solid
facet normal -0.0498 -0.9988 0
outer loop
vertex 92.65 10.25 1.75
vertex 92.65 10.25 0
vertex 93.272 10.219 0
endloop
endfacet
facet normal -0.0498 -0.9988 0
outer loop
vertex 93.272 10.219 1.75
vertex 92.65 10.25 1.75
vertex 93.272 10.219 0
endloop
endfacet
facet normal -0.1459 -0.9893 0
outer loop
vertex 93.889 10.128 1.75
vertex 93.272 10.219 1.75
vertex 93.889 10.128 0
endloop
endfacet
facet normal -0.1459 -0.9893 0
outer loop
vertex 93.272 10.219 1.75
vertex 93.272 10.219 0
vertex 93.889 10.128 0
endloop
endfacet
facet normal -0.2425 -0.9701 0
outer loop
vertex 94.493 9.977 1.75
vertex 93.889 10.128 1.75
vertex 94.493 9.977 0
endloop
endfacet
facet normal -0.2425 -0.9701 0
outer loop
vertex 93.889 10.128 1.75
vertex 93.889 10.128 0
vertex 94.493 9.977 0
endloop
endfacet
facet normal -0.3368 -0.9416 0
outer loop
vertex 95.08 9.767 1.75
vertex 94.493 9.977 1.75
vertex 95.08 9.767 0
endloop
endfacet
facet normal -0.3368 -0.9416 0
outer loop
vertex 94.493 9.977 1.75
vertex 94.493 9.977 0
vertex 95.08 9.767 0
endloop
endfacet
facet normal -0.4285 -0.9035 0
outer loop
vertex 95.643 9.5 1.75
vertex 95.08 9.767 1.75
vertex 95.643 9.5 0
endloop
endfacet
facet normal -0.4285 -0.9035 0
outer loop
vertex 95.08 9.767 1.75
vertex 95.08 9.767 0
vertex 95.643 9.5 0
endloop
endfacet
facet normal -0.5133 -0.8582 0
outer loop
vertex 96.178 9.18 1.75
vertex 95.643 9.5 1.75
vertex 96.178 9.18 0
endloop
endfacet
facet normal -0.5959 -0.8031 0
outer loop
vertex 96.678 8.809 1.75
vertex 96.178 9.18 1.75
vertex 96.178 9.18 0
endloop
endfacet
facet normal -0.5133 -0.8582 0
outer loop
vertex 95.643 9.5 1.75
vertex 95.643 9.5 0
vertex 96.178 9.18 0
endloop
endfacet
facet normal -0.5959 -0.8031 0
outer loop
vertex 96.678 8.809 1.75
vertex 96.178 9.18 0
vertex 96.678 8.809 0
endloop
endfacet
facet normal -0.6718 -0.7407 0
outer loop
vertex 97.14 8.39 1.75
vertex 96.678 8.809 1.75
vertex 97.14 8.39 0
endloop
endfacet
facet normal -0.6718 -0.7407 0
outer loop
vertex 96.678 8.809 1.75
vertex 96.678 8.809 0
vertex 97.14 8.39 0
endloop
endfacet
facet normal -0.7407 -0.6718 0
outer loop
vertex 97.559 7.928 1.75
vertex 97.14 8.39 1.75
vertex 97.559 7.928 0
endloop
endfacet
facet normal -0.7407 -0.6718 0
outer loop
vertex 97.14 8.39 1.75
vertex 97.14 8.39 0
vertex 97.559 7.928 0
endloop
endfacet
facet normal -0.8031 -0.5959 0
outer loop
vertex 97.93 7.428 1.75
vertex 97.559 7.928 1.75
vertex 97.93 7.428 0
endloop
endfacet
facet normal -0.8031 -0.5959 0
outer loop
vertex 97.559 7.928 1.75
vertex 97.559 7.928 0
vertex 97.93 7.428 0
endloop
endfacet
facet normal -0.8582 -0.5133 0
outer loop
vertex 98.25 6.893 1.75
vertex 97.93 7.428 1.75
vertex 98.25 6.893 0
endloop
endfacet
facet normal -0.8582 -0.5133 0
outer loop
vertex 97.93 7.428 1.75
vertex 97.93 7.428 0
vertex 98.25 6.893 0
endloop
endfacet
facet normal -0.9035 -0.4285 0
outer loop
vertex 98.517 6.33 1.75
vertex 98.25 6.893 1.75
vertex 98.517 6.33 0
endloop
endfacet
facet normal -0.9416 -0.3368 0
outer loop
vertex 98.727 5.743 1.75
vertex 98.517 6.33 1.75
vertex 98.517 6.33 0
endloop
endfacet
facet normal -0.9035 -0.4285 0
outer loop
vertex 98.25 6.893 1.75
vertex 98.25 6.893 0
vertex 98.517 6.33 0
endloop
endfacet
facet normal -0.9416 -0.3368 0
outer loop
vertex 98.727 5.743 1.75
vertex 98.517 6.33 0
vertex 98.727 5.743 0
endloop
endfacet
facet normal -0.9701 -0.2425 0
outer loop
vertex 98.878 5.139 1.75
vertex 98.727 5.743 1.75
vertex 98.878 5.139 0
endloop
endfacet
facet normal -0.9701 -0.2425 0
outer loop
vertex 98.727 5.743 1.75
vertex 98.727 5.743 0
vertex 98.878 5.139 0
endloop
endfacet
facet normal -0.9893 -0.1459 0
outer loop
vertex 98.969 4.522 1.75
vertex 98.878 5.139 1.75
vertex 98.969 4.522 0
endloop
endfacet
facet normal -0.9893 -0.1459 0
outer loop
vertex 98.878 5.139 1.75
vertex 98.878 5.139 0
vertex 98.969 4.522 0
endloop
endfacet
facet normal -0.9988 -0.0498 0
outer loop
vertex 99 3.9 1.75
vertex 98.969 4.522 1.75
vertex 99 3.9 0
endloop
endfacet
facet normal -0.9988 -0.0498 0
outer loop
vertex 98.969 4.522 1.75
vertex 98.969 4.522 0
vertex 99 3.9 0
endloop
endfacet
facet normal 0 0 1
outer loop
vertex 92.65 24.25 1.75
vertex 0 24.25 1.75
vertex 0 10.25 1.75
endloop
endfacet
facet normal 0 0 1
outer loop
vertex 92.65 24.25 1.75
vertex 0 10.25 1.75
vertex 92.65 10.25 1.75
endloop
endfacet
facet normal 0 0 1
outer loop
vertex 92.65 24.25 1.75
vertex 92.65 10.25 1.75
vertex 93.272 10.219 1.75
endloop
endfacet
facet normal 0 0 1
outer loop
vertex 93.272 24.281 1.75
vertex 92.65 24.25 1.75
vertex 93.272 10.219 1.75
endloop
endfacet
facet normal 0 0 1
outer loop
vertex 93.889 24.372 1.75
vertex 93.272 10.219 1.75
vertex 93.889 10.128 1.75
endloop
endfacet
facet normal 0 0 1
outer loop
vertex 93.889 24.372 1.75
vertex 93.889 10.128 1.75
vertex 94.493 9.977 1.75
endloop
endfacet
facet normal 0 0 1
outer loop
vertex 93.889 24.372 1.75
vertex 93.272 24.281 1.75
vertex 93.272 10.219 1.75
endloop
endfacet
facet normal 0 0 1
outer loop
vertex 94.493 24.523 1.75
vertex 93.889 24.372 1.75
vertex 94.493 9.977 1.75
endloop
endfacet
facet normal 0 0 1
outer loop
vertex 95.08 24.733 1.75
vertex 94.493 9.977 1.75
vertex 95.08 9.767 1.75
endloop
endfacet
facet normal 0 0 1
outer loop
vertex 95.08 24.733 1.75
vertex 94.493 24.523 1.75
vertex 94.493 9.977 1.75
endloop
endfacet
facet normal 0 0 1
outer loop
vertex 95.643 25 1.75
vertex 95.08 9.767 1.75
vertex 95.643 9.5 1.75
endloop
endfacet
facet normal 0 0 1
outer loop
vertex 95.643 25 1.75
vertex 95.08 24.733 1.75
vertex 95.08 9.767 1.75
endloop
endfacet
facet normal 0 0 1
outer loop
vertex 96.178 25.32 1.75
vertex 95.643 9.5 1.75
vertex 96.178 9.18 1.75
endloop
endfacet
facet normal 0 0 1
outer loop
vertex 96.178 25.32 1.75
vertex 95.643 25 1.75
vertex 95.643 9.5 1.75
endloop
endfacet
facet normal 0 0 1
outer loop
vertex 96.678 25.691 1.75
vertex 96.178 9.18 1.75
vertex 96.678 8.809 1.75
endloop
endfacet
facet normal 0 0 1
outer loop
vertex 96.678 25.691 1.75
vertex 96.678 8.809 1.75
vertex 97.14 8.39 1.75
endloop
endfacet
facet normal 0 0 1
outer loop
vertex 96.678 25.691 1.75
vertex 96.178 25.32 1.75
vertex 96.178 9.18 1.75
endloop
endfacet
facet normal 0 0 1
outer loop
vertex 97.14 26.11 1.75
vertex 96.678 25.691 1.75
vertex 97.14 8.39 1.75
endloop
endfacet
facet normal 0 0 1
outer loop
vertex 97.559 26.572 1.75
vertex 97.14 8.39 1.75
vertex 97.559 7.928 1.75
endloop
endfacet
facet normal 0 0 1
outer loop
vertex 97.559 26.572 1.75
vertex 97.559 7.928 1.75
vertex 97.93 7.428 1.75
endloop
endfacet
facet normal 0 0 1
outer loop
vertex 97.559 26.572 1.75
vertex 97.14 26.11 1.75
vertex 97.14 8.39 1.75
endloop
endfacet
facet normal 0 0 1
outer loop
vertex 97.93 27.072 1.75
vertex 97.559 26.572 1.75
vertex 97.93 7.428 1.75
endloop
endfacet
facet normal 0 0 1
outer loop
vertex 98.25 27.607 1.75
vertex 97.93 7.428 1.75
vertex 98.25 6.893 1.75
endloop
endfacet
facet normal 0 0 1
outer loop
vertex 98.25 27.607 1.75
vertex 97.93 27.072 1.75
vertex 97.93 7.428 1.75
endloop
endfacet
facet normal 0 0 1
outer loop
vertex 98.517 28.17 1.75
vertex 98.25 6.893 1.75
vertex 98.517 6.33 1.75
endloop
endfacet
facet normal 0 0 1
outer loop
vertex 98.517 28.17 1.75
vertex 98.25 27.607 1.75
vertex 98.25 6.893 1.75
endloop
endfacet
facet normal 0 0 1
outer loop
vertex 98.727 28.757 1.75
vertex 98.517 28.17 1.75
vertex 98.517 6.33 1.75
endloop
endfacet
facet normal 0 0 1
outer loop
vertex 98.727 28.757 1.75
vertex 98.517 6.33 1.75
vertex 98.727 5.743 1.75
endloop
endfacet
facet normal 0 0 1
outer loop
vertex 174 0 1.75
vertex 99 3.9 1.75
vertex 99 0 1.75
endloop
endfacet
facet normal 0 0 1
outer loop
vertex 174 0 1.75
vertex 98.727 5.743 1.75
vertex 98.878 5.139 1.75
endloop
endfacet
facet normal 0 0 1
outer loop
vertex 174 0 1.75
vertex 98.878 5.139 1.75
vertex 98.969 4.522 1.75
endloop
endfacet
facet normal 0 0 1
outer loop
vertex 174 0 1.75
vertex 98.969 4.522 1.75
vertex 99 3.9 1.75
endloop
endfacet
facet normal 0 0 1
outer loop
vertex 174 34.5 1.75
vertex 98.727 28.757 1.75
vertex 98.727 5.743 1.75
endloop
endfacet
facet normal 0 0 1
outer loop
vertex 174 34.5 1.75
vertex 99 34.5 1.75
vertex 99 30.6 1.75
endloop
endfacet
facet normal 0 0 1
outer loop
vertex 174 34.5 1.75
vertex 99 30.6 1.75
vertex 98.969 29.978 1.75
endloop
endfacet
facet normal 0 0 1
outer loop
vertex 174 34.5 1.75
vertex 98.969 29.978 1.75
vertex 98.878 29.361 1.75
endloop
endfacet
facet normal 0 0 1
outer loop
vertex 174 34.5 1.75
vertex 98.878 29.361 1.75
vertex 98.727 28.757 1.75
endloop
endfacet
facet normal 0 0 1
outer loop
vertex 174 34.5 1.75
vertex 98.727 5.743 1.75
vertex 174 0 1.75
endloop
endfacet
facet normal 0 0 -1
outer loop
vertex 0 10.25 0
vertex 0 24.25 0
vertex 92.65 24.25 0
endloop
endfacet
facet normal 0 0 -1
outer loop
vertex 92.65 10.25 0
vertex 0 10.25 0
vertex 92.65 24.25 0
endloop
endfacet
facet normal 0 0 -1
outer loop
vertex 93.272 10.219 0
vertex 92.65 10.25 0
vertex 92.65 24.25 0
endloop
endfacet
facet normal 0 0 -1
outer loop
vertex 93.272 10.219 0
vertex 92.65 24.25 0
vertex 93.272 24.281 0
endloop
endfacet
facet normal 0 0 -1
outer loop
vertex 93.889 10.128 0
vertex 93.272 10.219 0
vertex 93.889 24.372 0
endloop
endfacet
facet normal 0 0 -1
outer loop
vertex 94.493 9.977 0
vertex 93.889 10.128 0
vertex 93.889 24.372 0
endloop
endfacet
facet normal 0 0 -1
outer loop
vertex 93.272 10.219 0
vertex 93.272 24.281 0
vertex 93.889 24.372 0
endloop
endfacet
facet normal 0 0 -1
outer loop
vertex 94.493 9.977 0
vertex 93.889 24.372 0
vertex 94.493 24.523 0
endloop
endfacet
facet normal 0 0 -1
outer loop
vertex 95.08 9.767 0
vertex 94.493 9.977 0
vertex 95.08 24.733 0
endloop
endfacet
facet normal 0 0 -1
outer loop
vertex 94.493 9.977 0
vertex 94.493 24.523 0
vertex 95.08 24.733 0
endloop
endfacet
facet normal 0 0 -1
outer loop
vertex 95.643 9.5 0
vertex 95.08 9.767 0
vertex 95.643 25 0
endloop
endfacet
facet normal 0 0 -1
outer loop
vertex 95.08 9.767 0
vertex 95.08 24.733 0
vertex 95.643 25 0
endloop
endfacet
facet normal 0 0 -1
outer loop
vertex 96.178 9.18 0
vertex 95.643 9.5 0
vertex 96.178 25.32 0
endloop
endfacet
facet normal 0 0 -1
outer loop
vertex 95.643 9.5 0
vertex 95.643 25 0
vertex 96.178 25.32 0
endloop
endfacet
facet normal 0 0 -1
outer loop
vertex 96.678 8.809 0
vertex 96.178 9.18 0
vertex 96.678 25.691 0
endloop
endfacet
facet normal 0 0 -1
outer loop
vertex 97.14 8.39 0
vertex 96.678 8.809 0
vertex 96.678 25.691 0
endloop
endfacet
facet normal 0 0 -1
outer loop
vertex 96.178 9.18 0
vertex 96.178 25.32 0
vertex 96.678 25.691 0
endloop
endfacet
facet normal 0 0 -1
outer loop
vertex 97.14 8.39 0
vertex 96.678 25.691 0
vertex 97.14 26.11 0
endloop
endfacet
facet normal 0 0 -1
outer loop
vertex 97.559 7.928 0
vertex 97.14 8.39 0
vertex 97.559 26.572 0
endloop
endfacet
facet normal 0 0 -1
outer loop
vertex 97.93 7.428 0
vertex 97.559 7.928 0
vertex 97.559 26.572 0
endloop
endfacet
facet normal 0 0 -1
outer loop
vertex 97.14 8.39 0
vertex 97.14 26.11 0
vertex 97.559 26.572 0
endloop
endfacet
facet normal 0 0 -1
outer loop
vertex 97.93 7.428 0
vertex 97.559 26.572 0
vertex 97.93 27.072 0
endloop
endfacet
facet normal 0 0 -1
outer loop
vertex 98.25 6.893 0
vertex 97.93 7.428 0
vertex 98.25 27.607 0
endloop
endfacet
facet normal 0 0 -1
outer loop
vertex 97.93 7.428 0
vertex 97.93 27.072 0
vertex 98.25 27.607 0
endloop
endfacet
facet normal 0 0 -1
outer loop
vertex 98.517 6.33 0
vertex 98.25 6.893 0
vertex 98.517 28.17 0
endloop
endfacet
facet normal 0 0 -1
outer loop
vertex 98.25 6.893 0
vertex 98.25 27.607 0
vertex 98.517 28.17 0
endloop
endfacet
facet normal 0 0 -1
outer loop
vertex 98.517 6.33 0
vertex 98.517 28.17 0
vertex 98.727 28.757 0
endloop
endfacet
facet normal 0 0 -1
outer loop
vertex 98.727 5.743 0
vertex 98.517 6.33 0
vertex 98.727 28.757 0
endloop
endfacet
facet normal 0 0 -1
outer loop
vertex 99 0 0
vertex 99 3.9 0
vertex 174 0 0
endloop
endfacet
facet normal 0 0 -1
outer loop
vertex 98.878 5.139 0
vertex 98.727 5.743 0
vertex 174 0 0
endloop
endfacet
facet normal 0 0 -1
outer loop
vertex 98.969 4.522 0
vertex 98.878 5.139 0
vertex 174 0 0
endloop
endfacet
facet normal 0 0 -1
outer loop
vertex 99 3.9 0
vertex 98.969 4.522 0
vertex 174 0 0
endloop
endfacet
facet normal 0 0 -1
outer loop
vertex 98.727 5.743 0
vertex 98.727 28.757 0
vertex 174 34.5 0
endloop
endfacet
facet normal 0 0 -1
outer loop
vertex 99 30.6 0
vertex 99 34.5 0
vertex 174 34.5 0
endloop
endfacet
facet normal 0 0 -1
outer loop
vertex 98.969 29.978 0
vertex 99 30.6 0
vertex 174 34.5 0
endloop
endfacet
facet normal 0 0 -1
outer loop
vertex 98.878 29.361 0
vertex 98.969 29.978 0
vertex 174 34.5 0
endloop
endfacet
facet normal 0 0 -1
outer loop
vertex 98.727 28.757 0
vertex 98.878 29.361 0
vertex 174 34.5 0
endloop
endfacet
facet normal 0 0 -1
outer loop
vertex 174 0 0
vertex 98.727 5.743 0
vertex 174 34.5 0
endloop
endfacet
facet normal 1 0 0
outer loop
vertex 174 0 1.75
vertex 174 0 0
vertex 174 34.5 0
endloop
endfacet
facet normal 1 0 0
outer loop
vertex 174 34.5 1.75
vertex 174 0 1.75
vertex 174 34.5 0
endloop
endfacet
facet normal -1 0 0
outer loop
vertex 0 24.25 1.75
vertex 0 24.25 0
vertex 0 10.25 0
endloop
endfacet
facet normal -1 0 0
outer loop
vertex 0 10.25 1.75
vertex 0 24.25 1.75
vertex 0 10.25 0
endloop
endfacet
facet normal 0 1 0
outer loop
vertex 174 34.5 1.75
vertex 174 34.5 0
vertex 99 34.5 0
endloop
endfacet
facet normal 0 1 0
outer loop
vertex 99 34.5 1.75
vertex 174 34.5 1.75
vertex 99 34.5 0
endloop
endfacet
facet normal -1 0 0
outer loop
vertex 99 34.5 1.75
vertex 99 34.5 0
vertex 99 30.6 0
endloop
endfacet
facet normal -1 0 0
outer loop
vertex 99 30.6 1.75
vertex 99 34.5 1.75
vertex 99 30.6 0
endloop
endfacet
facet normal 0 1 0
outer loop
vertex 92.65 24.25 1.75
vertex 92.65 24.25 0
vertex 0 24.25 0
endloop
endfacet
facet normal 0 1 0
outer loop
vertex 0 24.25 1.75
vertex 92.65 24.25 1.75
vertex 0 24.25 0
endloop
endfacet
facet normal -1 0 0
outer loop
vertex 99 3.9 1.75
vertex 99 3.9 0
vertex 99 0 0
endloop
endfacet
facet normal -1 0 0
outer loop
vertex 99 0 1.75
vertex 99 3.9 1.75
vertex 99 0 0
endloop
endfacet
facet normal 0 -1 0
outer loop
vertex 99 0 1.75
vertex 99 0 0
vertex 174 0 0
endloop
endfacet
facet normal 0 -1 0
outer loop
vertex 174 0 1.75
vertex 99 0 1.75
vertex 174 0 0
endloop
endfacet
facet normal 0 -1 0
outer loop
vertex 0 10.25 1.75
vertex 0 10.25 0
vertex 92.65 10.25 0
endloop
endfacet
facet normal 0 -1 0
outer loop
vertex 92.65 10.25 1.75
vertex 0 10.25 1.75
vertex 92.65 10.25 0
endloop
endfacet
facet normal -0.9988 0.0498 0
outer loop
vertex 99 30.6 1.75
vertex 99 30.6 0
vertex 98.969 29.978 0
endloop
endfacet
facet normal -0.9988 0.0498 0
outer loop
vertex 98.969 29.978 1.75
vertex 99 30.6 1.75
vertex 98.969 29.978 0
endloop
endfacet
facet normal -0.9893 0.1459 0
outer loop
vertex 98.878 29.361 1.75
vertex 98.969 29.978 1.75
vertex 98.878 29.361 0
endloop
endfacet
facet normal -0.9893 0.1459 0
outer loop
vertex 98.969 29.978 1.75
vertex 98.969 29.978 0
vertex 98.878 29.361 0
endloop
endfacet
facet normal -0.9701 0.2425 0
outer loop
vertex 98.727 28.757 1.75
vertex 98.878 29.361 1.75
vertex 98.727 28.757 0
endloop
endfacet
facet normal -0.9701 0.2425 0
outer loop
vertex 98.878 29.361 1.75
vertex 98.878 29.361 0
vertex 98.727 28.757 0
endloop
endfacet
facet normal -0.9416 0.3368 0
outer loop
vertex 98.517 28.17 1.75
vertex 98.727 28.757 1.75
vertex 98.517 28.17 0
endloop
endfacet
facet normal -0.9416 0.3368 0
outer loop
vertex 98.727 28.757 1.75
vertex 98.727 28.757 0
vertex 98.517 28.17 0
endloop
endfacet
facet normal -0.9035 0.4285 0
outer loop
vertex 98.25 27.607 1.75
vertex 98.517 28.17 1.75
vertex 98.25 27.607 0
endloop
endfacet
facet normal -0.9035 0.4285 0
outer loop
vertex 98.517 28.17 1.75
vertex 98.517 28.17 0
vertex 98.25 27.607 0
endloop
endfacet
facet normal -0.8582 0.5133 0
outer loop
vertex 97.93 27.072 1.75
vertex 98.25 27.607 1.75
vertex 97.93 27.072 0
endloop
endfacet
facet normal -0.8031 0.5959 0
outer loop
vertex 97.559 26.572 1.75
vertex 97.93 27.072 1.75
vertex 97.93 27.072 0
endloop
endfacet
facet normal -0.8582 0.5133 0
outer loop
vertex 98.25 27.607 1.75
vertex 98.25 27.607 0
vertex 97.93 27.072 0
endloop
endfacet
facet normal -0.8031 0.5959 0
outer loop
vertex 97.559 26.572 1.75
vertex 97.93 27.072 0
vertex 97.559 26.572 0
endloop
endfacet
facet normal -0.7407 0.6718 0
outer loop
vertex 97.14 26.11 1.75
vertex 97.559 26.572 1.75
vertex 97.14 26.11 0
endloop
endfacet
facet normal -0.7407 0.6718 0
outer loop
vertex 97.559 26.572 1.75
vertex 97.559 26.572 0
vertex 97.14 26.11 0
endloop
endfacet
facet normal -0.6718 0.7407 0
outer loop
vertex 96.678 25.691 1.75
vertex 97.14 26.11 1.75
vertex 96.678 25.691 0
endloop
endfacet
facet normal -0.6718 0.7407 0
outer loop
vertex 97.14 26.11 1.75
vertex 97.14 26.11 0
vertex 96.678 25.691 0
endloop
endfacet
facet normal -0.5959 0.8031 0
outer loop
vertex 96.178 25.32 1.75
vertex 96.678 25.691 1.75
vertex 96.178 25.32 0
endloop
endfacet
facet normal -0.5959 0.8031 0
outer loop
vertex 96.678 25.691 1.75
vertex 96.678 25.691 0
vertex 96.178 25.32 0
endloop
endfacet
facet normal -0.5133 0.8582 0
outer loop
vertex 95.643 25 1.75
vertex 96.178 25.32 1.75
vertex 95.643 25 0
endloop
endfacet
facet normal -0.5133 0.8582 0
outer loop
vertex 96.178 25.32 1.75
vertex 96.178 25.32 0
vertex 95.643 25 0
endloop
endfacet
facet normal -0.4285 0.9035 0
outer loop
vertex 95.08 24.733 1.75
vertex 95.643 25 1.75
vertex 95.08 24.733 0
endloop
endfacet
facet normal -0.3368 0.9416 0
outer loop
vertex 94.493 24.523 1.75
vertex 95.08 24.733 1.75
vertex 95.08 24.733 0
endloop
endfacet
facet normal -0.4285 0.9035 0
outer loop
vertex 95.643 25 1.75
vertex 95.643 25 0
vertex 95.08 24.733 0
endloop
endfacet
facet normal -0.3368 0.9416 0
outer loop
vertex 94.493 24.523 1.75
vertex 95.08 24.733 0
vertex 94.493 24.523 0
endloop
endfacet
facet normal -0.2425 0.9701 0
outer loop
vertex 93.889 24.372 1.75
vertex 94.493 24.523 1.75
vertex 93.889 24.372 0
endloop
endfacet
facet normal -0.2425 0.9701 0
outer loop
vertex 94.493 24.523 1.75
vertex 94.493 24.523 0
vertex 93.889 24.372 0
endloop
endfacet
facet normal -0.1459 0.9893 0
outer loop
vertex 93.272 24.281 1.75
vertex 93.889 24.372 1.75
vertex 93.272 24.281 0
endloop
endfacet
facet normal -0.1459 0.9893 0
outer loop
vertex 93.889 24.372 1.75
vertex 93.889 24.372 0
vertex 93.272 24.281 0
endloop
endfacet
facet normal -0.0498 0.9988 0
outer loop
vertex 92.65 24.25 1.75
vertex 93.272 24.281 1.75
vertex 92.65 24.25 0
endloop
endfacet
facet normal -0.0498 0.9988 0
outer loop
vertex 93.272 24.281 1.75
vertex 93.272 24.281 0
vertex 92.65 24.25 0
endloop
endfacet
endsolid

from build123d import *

# Parameters (mm, degrees)
F1_DEPTH = 1.75


with BuildPart() as f1:
    # F0 (on Top) → F1 (new body)
    with BuildSketch(Plane.XY):
        with BuildLine():
            Line((99, 3.9), (99, 0))
            Line((99, 0), (174, 0))
            Line((174, 0), (174, 34.5))
            Line((174, 34.5), (99, 34.5))
            Line((99, 34.5), (99, 30.6))
            ThreePointArc((99, 30.6), (97.1401280605, 26.1098719395), (92.65, 24.25))
            Line((92.65, 24.25), (0, 24.25))
            Line((0, 24.25), (0, 10.25))
            Line((0, 10.25), (92.65, 10.25))
            ThreePointArc((92.65, 10.25), (97.1401280605, 8.3901280605), (99, 3.9))
        make_face()
    extrude(amount=F1_DEPTH)


solid = f1.part
